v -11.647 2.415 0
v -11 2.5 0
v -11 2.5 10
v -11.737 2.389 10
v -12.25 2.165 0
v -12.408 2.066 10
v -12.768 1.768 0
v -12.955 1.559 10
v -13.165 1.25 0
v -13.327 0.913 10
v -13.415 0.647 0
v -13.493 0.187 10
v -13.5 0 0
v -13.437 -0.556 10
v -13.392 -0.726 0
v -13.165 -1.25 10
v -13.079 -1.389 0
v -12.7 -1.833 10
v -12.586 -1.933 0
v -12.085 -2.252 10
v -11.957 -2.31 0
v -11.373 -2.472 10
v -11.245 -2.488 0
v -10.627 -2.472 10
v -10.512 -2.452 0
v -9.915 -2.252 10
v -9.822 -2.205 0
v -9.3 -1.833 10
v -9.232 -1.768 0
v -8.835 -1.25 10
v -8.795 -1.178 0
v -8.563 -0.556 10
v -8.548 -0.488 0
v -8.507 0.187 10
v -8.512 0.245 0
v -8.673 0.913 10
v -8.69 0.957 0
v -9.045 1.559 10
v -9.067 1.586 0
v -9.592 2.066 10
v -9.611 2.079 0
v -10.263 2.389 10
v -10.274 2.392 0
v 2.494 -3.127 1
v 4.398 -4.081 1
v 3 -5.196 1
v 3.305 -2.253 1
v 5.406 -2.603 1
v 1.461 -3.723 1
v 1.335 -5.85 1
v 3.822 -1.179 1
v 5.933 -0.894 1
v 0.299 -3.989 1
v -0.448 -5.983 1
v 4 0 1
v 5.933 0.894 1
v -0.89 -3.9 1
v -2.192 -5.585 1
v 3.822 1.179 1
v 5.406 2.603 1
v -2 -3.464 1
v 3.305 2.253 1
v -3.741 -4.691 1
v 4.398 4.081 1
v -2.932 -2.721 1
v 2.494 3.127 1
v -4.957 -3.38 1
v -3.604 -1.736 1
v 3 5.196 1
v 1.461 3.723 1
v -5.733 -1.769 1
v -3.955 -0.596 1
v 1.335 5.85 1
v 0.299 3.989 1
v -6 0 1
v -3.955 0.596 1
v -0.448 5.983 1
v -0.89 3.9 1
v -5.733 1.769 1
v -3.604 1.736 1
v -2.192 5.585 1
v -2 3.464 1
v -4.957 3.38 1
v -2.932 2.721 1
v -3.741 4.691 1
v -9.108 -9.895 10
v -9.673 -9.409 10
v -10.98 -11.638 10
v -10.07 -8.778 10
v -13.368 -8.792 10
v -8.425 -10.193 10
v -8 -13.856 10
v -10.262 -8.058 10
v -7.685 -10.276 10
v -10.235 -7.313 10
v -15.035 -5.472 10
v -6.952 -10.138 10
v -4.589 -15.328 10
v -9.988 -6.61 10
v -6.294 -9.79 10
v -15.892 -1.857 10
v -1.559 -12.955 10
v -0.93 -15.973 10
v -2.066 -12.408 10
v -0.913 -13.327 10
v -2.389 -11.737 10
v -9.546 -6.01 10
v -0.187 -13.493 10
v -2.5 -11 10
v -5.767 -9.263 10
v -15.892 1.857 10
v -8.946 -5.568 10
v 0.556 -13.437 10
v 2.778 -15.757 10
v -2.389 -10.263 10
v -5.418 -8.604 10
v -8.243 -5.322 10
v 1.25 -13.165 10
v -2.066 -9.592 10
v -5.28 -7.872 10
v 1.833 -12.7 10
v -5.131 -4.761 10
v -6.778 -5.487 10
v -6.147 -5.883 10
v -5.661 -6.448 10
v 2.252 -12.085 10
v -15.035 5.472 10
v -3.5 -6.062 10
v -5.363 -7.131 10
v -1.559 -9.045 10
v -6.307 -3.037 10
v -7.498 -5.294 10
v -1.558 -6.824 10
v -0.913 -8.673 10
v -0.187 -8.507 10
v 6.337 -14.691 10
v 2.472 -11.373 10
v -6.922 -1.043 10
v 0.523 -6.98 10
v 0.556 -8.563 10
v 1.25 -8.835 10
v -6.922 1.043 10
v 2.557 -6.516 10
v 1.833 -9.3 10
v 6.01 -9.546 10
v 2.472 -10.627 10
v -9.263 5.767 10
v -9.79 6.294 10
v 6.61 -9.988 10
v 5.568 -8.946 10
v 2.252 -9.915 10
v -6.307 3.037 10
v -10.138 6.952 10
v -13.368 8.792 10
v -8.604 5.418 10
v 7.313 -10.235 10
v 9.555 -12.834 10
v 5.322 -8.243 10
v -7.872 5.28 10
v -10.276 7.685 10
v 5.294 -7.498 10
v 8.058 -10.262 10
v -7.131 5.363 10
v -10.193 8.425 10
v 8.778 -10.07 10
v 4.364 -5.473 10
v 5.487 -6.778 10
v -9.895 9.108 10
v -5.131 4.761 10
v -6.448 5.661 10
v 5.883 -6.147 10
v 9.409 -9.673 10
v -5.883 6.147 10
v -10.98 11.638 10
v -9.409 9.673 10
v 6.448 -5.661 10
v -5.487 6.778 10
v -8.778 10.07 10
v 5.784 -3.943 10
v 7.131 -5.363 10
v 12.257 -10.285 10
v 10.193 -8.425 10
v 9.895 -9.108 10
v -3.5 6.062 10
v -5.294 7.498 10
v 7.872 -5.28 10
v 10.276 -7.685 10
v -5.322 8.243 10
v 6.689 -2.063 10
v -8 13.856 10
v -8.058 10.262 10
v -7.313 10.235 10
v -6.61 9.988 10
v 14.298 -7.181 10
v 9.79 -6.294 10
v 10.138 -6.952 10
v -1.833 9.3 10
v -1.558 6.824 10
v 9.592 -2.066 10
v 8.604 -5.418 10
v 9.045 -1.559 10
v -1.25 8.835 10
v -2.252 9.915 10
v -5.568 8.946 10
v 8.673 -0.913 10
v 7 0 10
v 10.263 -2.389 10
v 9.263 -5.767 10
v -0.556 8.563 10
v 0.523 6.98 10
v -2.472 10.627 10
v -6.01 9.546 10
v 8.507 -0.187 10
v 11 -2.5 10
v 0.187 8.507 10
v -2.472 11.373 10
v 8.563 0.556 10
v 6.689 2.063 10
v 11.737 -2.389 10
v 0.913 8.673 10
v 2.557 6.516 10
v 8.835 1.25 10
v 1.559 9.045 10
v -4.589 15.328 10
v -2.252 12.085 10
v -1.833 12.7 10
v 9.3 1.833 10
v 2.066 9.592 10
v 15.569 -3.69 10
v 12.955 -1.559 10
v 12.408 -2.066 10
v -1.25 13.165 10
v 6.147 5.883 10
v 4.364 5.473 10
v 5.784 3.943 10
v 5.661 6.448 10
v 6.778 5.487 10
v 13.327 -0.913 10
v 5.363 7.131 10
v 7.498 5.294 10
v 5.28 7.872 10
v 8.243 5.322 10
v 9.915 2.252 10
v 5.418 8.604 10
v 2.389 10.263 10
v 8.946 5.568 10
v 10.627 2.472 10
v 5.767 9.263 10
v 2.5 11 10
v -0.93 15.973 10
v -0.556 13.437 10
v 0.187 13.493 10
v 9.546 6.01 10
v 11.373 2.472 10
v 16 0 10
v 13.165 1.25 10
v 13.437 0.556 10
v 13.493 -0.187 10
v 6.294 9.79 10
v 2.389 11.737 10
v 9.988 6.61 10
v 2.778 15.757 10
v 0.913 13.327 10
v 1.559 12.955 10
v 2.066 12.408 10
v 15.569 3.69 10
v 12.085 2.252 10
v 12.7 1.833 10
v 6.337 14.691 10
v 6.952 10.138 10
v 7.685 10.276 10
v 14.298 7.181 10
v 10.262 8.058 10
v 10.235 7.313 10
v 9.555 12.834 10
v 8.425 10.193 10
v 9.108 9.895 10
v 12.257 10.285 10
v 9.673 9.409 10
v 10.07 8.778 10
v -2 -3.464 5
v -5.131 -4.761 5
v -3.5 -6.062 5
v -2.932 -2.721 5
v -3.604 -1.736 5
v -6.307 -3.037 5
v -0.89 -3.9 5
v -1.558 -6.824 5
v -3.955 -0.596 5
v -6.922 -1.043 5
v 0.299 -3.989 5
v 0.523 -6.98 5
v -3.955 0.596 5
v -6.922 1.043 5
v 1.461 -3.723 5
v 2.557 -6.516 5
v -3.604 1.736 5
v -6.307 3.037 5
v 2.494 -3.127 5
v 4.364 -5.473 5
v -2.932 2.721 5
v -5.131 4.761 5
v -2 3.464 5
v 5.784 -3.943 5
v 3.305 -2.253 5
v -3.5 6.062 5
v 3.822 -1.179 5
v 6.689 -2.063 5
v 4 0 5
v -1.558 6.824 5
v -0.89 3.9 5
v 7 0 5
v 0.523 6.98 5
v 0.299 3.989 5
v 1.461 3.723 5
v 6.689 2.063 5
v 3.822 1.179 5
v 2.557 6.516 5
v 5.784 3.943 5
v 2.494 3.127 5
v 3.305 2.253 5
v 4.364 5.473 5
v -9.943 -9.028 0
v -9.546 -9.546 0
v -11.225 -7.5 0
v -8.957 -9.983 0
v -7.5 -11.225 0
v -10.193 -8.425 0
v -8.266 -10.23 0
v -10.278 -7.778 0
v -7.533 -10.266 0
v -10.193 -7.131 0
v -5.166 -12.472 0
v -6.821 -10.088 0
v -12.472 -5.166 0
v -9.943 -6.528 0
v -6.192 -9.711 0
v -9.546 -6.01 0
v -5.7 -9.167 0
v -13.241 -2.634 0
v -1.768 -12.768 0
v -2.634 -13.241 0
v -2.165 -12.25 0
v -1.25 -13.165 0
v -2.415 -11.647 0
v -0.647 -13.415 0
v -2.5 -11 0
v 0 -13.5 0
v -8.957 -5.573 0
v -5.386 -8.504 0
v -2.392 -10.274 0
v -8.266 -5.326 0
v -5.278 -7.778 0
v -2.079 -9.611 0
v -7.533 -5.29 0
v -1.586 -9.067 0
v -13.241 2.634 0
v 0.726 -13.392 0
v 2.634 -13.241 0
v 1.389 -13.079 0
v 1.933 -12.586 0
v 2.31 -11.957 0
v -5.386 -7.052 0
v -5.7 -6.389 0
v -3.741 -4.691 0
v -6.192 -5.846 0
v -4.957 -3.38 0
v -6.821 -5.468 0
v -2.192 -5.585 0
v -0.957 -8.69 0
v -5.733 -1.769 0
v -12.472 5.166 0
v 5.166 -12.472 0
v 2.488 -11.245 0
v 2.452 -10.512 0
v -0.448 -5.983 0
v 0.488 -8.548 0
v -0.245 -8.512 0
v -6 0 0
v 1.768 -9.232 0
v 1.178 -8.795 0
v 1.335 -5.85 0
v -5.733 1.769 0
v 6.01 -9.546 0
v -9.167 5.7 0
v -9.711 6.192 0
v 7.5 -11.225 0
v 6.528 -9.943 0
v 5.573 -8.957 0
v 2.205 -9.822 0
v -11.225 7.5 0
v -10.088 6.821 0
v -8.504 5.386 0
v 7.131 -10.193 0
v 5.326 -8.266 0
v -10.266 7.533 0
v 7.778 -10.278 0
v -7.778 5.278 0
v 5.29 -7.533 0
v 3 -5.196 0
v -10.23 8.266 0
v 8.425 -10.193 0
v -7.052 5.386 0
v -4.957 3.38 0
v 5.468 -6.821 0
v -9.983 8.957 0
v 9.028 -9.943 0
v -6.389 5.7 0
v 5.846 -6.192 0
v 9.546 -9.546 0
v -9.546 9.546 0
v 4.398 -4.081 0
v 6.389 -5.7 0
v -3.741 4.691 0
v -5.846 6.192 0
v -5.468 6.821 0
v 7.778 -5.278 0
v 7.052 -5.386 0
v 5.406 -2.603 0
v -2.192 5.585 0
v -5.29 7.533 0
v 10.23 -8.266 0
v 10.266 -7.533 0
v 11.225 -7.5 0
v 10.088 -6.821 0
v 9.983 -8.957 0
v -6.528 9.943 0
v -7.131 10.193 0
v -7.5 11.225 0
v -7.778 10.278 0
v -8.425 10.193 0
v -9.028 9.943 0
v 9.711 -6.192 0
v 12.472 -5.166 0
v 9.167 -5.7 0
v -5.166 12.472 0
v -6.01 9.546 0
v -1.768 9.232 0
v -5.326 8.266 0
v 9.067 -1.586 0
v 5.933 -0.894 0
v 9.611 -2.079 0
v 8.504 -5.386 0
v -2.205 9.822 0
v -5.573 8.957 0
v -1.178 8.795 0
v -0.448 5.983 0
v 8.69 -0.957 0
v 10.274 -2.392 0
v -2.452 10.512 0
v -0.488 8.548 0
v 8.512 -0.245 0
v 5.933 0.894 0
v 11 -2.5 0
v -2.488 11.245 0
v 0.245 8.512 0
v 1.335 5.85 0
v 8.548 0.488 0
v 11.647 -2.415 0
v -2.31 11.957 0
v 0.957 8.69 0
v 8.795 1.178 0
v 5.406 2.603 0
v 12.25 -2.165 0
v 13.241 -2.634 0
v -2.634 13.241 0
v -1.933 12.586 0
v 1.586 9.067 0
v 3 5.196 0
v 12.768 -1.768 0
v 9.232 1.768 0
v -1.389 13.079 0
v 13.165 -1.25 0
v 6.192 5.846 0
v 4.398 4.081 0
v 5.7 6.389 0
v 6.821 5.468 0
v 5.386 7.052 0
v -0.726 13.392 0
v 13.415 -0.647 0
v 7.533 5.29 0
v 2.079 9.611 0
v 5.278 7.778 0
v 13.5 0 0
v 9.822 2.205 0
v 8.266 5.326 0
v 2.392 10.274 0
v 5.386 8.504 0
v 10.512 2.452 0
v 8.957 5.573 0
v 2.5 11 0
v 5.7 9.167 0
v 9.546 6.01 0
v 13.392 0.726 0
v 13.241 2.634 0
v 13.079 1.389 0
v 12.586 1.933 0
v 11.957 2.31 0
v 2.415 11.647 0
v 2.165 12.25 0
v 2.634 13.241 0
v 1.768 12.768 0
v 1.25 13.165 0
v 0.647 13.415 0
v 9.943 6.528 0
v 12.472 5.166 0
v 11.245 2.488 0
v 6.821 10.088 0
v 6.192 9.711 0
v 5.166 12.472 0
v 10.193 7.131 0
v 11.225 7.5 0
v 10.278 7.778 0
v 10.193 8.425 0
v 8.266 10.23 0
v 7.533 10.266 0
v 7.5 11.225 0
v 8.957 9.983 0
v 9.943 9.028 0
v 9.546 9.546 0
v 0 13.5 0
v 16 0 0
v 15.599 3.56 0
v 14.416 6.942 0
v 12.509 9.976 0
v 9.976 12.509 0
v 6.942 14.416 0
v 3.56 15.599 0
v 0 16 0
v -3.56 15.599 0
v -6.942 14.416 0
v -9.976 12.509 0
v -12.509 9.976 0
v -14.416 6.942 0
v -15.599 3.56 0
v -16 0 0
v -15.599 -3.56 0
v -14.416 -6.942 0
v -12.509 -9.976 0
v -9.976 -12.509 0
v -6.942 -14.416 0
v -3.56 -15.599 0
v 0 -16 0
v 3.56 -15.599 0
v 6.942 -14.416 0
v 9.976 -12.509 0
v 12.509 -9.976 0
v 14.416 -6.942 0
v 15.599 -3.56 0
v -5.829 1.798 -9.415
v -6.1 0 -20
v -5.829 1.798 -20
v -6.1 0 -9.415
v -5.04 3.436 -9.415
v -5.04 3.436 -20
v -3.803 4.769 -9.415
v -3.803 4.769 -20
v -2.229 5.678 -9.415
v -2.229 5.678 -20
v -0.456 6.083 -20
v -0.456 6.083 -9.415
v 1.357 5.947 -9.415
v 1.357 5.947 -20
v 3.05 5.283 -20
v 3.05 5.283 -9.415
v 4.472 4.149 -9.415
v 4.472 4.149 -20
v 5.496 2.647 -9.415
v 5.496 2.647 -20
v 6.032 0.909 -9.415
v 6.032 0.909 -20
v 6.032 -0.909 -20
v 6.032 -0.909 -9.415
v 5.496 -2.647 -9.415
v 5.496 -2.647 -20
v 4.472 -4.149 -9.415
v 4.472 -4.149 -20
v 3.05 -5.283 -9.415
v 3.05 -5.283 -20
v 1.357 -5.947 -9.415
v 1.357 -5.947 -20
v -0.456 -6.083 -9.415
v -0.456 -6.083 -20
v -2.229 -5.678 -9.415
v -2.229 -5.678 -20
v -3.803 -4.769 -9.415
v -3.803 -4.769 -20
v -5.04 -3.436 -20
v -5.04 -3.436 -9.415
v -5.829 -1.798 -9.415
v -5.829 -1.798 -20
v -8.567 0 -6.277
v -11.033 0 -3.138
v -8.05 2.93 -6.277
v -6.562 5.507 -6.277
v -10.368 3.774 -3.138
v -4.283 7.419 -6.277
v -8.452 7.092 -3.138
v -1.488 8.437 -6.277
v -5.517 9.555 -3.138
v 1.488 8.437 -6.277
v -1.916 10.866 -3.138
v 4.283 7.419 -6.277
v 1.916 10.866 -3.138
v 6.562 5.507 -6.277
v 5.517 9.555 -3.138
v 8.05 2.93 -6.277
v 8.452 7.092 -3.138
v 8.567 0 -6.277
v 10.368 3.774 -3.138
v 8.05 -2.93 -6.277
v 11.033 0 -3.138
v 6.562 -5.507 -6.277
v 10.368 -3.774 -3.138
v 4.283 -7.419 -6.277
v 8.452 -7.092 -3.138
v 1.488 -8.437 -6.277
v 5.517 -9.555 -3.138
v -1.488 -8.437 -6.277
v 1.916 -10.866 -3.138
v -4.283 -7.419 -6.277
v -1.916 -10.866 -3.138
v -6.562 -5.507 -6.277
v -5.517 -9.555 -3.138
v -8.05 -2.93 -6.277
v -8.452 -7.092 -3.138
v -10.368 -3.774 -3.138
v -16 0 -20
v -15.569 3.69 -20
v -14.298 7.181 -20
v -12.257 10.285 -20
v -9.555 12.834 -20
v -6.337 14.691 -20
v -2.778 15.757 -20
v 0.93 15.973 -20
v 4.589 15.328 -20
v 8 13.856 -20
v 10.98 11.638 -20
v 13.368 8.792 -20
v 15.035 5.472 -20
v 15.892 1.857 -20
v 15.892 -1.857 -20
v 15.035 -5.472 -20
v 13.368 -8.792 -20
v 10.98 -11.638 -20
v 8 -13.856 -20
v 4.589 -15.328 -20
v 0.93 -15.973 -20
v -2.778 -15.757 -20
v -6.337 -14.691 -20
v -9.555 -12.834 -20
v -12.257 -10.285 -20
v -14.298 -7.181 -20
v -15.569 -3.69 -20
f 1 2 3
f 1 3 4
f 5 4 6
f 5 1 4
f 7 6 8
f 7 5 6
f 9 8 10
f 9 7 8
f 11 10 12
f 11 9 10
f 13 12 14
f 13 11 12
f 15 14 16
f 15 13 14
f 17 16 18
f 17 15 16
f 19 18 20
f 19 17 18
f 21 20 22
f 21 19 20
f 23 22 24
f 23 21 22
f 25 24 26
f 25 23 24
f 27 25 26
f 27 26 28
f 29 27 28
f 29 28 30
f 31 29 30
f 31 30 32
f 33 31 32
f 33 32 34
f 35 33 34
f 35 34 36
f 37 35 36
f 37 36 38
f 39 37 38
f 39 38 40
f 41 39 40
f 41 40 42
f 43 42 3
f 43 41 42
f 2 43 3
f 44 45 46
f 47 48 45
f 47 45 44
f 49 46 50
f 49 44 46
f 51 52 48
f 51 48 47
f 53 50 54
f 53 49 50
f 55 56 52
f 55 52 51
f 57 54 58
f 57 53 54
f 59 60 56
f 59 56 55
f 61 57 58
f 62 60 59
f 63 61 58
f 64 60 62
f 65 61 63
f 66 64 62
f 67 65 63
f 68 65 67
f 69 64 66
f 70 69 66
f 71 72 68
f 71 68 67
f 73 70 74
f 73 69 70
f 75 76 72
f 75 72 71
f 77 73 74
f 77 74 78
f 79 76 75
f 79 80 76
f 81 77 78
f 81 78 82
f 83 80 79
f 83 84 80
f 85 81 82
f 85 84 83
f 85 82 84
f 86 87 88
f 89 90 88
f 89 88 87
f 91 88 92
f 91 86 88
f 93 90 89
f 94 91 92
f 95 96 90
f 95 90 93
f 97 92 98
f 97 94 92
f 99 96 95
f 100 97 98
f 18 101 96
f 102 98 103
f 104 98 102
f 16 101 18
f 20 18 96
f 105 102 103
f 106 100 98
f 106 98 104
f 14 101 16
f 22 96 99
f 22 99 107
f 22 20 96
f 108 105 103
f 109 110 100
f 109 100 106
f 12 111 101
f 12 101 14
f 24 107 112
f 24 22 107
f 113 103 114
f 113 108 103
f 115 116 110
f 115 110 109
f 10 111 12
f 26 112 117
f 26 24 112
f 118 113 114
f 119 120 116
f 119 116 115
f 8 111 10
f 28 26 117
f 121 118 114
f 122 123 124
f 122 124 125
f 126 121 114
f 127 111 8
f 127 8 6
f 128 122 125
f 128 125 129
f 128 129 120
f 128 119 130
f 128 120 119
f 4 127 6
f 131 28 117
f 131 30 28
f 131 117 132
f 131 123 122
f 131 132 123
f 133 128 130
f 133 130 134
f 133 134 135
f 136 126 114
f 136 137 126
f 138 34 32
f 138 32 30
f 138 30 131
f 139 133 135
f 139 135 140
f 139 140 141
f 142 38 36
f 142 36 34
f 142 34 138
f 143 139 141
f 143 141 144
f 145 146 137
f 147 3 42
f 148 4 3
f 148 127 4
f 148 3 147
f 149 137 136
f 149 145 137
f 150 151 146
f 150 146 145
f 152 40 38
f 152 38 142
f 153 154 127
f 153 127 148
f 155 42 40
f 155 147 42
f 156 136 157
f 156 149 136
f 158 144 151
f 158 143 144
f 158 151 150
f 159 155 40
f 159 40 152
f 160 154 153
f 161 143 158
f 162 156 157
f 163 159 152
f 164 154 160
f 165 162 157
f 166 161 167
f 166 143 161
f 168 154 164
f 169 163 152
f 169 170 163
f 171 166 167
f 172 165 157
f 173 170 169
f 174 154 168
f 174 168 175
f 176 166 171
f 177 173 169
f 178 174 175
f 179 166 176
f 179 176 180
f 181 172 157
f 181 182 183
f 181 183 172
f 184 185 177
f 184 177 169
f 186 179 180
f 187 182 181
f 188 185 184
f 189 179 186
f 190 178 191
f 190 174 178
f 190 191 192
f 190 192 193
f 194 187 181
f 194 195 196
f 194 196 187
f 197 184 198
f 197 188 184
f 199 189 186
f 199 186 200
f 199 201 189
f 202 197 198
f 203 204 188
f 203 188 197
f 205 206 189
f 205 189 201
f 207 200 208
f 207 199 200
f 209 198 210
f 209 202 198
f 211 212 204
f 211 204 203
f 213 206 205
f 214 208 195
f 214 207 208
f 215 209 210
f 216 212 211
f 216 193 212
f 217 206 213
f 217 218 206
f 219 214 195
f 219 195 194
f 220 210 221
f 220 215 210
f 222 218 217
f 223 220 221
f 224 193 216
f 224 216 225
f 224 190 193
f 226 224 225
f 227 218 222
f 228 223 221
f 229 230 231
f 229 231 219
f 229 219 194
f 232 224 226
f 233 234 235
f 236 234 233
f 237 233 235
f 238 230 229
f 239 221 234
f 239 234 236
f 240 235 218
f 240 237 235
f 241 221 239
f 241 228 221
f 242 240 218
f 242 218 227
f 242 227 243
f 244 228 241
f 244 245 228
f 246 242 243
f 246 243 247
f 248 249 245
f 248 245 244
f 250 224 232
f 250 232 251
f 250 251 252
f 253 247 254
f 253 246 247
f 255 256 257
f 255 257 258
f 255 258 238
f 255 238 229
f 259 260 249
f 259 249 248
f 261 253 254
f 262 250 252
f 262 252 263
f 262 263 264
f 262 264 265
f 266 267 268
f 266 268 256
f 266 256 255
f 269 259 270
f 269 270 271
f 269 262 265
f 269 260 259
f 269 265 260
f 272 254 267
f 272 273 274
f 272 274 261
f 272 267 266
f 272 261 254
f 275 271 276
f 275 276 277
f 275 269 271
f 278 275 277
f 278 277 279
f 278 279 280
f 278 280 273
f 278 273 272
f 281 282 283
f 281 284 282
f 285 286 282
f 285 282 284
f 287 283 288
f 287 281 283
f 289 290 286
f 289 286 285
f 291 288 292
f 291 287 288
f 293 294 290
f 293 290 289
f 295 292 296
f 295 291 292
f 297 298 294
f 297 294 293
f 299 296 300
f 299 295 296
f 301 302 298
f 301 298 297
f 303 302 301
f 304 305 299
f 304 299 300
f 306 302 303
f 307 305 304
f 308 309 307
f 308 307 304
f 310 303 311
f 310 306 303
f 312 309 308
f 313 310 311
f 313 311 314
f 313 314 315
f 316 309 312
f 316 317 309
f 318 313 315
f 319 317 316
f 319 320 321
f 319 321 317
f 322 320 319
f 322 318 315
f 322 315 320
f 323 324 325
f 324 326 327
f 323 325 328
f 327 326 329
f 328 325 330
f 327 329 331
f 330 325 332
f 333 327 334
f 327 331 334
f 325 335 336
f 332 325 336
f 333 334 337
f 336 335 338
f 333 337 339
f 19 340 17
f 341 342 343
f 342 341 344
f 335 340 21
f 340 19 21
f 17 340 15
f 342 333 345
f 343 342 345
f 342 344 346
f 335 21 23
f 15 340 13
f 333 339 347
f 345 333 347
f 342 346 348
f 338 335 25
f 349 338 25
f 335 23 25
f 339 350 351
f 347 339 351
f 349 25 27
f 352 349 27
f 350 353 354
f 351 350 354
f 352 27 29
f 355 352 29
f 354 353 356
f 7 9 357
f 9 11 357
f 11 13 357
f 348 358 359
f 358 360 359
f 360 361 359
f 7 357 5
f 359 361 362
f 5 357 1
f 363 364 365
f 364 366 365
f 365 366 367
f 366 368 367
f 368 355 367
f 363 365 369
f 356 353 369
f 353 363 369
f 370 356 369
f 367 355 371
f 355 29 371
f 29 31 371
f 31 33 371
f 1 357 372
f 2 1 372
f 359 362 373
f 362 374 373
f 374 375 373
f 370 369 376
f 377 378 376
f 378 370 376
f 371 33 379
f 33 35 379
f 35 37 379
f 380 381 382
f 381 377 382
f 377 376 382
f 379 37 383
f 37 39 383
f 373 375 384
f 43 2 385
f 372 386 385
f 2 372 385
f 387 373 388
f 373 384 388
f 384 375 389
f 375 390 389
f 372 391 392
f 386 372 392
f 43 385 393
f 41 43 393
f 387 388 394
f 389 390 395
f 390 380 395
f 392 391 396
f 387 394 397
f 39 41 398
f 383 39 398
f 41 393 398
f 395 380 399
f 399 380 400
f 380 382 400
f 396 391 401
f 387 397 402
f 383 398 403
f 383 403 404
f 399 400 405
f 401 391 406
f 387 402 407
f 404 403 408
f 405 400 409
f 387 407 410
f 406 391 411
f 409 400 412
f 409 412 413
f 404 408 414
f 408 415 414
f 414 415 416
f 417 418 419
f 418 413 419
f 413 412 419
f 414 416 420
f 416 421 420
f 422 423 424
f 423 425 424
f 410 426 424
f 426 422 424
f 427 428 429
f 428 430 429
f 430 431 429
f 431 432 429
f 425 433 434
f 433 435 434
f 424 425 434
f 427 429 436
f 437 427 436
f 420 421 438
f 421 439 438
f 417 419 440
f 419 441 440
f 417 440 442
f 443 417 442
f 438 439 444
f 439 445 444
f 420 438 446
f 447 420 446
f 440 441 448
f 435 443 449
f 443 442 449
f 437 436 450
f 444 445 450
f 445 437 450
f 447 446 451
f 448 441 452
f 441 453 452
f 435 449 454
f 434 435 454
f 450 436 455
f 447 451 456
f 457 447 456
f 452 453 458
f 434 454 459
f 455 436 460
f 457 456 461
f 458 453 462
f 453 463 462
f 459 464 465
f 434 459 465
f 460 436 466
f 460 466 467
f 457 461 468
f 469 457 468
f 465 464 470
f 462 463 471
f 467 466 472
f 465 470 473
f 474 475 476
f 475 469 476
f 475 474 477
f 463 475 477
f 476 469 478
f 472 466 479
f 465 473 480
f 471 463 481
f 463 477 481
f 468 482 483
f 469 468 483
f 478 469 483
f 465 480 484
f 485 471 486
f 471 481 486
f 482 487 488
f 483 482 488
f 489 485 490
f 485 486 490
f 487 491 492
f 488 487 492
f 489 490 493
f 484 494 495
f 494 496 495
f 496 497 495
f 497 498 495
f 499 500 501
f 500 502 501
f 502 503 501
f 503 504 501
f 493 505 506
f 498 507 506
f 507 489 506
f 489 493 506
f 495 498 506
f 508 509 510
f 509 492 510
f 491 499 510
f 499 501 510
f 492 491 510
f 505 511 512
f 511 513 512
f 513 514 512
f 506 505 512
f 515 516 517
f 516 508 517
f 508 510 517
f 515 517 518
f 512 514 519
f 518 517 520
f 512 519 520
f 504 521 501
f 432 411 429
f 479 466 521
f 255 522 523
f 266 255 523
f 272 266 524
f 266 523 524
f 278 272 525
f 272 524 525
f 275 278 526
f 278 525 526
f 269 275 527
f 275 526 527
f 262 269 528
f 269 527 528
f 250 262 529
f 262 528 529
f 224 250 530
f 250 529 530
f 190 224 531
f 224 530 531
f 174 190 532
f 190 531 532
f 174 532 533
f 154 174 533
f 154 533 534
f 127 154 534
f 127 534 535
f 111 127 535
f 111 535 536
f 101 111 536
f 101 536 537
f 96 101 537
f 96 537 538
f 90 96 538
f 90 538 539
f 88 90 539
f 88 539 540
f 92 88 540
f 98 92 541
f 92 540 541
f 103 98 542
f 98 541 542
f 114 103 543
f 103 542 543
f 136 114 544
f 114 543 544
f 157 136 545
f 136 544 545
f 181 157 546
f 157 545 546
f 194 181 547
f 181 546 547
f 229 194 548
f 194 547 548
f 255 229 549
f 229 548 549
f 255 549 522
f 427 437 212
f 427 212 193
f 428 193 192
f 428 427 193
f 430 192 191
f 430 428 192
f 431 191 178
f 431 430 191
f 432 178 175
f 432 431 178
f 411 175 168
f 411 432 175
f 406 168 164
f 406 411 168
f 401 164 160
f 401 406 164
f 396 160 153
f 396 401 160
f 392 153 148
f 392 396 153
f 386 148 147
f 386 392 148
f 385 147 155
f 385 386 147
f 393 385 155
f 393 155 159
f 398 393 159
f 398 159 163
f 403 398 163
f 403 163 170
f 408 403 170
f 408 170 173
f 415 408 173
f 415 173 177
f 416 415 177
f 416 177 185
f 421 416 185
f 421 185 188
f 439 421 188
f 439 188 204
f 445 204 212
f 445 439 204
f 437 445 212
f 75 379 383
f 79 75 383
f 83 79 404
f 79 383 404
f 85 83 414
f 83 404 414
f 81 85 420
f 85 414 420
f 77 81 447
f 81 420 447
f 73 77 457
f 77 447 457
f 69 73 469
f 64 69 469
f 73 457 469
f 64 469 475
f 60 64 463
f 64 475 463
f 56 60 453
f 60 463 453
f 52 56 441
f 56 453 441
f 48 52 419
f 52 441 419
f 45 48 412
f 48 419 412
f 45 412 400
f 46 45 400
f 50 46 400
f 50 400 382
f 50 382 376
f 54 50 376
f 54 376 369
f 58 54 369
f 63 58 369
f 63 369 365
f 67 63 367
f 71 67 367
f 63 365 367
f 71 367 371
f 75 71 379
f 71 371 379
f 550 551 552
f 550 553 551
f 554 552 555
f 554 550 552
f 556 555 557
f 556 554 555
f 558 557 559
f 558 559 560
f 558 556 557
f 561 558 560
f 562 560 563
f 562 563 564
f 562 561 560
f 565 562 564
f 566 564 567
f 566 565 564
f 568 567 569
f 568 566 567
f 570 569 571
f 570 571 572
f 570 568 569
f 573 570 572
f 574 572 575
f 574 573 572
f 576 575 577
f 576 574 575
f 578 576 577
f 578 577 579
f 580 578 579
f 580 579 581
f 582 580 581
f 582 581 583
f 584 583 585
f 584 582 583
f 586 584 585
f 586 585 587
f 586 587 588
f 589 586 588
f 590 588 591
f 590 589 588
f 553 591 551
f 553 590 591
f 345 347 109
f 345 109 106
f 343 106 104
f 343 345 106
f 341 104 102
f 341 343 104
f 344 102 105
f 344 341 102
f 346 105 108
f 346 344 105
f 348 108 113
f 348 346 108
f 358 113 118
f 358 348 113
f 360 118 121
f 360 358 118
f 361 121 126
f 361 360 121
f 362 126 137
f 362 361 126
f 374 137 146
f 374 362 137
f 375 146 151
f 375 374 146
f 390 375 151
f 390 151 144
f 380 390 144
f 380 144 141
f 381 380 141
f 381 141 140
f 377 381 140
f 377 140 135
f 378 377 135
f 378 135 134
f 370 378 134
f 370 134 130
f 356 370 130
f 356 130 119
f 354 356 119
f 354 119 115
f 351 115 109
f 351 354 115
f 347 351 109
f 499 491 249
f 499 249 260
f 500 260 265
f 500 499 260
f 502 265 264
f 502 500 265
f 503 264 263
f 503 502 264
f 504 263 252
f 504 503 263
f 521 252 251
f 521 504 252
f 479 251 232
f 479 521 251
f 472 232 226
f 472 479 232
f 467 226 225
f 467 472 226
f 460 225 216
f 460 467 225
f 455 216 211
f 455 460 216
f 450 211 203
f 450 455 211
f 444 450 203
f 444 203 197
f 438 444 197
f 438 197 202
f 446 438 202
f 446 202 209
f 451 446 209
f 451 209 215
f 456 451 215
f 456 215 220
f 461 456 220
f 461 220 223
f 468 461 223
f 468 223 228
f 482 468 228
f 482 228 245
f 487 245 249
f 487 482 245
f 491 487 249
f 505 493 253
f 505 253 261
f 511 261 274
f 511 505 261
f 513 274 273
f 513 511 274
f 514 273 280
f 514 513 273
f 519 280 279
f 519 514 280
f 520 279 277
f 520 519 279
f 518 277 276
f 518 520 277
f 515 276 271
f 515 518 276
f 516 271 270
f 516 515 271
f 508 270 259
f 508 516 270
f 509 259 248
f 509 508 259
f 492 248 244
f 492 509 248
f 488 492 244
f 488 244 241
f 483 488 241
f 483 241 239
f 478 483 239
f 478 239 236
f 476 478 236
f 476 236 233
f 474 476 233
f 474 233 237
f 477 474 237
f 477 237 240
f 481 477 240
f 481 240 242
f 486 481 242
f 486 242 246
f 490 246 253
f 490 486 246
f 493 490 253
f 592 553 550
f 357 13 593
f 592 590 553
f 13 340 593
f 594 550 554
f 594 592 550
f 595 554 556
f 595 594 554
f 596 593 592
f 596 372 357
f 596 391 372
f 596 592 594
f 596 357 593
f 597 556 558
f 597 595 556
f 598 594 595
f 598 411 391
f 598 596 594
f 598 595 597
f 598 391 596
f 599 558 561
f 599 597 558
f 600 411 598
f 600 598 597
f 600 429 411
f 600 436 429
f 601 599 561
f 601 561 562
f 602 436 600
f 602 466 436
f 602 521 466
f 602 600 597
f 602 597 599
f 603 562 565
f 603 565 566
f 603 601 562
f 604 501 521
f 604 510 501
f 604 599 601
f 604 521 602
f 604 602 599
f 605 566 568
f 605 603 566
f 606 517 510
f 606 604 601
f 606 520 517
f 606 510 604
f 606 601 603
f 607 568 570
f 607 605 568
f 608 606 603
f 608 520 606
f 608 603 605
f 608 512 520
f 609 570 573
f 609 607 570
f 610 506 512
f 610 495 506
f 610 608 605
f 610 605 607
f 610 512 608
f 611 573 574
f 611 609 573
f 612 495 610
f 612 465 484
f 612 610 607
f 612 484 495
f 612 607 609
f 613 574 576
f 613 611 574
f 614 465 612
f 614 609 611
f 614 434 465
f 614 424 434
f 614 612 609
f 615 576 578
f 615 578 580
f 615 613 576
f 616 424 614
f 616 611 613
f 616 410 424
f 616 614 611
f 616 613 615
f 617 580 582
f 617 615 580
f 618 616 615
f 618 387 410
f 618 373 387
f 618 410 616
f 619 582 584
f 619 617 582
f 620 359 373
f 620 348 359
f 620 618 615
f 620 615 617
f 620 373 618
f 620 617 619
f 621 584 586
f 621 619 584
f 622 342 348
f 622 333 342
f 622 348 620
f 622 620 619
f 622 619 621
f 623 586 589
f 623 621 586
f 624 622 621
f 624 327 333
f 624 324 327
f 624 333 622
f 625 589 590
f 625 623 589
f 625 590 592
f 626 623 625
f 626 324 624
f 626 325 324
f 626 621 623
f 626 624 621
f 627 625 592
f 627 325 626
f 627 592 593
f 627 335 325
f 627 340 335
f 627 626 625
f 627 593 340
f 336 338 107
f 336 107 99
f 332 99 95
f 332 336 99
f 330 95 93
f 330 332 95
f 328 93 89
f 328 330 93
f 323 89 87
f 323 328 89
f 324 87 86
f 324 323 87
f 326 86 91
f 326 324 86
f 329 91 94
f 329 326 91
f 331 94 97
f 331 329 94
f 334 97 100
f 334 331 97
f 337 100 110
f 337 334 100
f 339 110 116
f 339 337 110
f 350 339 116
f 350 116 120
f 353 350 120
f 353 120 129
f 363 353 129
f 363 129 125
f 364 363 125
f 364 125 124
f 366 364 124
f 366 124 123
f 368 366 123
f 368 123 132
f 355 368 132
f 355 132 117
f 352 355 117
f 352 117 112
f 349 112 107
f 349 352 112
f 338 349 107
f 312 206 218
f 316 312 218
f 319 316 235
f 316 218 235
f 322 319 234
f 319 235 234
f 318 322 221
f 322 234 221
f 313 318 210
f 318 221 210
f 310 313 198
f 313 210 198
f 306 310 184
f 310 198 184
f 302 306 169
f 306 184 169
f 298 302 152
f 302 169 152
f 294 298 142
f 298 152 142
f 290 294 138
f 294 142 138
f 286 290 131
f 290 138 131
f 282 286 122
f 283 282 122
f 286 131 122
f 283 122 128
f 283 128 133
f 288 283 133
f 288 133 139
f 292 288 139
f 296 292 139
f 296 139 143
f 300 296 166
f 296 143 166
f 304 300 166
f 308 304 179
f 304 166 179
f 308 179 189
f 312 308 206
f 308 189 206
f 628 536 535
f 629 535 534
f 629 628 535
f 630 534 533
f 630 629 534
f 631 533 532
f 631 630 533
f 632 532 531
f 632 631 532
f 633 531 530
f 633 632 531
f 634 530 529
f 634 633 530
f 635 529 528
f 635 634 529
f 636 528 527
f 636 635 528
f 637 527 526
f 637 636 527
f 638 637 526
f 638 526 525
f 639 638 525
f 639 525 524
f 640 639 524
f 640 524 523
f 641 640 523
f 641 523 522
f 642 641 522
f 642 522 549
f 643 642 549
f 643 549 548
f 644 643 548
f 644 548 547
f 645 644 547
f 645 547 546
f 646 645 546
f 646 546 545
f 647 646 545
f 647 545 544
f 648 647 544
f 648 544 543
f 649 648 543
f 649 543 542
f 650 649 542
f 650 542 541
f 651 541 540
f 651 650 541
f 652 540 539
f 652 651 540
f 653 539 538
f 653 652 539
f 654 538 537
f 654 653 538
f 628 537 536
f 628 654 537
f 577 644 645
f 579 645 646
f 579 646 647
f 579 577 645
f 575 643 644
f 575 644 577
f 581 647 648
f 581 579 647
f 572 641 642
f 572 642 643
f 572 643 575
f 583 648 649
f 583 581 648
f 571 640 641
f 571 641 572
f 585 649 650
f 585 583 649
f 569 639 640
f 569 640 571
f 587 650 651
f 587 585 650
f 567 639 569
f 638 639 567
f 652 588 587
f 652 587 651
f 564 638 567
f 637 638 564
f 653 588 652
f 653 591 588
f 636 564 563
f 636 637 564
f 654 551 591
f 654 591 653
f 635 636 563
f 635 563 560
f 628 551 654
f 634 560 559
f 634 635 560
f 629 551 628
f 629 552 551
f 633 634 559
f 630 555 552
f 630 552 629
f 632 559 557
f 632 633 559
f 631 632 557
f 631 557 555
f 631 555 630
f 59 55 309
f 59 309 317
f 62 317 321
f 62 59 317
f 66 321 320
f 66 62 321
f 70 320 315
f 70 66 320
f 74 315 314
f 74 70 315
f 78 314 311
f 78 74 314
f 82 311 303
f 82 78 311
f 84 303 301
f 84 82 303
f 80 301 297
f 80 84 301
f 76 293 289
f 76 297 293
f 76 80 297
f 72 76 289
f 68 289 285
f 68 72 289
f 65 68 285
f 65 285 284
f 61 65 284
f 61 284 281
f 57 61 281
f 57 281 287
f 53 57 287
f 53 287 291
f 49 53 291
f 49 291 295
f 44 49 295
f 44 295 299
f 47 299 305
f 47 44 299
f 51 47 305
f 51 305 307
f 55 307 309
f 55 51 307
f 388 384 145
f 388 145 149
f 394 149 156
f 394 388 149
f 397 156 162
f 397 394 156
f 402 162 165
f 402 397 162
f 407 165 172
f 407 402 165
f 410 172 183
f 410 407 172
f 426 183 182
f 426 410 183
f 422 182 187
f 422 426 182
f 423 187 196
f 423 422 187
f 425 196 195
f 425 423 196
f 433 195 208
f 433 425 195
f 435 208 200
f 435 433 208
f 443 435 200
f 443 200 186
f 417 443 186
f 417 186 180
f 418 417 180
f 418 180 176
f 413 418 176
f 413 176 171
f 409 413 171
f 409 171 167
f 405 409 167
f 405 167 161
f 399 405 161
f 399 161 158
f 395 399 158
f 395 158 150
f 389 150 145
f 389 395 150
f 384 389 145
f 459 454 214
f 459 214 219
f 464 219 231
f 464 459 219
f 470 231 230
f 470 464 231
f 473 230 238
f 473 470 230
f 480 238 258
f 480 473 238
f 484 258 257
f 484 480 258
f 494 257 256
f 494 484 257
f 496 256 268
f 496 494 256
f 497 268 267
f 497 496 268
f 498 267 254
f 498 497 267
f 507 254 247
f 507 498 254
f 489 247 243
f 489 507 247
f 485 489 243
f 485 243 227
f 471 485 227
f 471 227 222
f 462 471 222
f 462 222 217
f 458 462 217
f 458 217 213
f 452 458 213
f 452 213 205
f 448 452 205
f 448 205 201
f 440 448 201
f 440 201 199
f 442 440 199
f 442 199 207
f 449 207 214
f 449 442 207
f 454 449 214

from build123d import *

# Parameters (mm, degrees)
SKETCH_1_R               = 16
SKETCH_1_R_2             = 4
EXTRUDE_1_DEPTH          = 10
SKETCH_2_R               = 2.5
CUT_EXTRUDE_1_DEPTH      = 20
PATTERN_CIRCULAR_1_COUNT = 8
SKETCH_3_R               = 7
CUT_EXTRUDE_2_DEPTH      = 5
SKETCH_4_R               = 6
CUT_EXTRUDE_3_DEPTH      = 1
EXTRUDE_START            = 20
SKETCH_5_R               = 16
SKETCH_5_R_2             = 14
EXTRUDE_2_DEPTH          = 20


with BuildPart() as part:
    # 스케치1 → 보스-돌출1 (new body)
    with BuildSketch(Plane.XY):
        Circle(SKETCH_1_R)
        Circle(SKETCH_1_R_2, mode=Mode.SUBTRACT)
    extrude(amount=EXTRUDE_1_DEPTH)

    # 스케치2 → 컷-돌출1 (cut)
    with BuildSketch(Plane.XY):
        with Locations((0, 11)):
            Circle(SKETCH_2_R)
    cut_extrude_1 = extrude(amount=CUT_EXTRUDE_1_DEPTH, mode=Mode.SUBTRACT)

    # 원형 패턴1: 컷-돌출1 ×8 about axis
    pattern_circular_1_axis = Axis((0, 0, 0), (0, 0, 1))
    for i in range(1, PATTERN_CIRCULAR_1_COUNT):
        add(cut_extrude_1.rotate(pattern_circular_1_axis, i * 360 / PATTERN_CIRCULAR_1_COUNT), mode=Mode.SUBTRACT)

    # 스케치3 → 컷-돌출2 (cut)
    with BuildSketch(Plane.XY.offset(10)):
        Circle(SKETCH_3_R)
    extrude(amount=-CUT_EXTRUDE_2_DEPTH, mode=Mode.SUBTRACT)

    # 스케치4 → 컷-돌출3 (cut)
    with BuildSketch(Plane(origin=(0, 0, 0), x_dir=(-1, 0, 0), z_dir=(0, 0, -1))):
        Circle(SKETCH_4_R)
    extrude(amount=-CUT_EXTRUDE_3_DEPTH, mode=Mode.SUBTRACT)

    # 스케치5 → 보스-돌출2 (add)
    with BuildSketch(Plane(origin=(0, 0, 0), x_dir=(-1, 0, 0), z_dir=(0, 0, -1)).offset(EXTRUDE_START)):
        Circle(SKETCH_5_R)
        Circle(SKETCH_5_R_2, mode=Mode.SUBTRACT)
    extrude(amount=-EXTRUDE_2_DEPTH)

    # 스케치6 → 회전1 (revolve)
    with BuildSketch(Plane(origin=(0, 0, 0), x_dir=(0, 0, -1), z_dir=(1, 0, 0)), mode=Mode.PRIVATE) as revolve_1_sk:
        Polygon((20, 14), (20, 6.1), (9.414853381, 6.1), (0, 13.5), (0, 14), align=None)
    revolve(revolve_1_sk.sketch.rotate(Axis((0, 0, 0), (0, 0, -1)), 270), axis=Axis((0, 0, 0), (0, 0, -1)))


solid = part.part
